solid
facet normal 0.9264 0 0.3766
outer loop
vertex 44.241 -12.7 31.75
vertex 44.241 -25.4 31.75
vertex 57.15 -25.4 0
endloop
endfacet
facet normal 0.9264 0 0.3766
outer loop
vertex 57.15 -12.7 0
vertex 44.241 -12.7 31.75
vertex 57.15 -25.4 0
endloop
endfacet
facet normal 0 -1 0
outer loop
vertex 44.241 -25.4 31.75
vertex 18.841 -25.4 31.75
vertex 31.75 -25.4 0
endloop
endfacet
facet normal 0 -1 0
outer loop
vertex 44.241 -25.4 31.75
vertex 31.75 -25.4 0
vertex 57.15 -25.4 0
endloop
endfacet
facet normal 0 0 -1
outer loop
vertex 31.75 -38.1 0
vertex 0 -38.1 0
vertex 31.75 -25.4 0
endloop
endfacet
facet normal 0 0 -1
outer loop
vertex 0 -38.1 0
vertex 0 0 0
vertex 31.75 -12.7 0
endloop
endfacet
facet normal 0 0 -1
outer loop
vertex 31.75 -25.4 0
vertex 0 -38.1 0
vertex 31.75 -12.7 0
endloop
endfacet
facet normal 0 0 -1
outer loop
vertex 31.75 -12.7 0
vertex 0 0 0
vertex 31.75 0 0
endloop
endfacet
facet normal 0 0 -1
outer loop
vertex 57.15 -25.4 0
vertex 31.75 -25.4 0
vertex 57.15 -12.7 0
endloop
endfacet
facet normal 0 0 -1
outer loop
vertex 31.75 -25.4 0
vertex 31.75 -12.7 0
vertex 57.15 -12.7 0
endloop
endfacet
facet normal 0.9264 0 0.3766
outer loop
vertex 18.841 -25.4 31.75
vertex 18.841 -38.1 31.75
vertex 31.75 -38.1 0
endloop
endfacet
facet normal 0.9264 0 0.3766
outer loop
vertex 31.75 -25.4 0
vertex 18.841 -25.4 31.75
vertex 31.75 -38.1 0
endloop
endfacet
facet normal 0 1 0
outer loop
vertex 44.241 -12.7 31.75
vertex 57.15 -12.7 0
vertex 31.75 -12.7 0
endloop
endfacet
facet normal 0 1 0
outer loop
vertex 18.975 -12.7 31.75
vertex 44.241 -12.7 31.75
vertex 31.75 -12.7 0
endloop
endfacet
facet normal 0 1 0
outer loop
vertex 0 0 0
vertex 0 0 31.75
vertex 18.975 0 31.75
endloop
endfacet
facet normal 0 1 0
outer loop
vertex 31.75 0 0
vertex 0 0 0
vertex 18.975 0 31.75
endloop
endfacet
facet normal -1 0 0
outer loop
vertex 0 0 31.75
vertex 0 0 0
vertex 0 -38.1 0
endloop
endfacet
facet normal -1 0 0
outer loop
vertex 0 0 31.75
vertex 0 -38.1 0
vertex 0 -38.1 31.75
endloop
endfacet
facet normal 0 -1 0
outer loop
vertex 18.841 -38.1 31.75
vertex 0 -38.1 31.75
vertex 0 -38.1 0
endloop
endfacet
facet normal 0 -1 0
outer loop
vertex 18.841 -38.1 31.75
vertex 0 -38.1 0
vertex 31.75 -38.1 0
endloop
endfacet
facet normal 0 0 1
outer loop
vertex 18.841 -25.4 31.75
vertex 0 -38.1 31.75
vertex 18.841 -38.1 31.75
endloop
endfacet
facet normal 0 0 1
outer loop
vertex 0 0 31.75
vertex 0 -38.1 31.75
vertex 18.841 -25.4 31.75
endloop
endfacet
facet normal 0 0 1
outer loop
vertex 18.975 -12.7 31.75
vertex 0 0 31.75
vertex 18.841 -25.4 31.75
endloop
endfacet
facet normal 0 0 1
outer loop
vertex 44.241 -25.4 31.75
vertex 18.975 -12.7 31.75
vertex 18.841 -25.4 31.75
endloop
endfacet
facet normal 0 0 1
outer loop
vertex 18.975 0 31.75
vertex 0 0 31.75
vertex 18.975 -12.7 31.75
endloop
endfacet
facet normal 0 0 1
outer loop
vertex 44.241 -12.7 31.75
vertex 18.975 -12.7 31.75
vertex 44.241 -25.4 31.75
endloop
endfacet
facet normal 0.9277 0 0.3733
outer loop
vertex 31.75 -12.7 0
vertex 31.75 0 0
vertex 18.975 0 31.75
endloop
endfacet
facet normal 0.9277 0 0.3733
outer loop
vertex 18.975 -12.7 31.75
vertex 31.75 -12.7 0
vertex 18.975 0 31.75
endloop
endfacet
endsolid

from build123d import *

# Parameters (mm, degrees)
F0_W     = 57.15
F0_H     = 31.75
F1_DEPTH = 38.1
F2_W     = 25.4
F2_H     = 31.75
F3_DEPTH = 12.7
F4_DEPTH = 12.7
F6_DEPTH = 12.7
F8_DEPTH = 12.7


with BuildPart() as f1:
    # F0 (on Front) → F1 (new body)
    with BuildSketch(Plane.XZ):
        with Locations((28.575, 15.875)):
            Rectangle(F0_W, F0_H)
    extrude(amount=F1_DEPTH)

    # F2 (on face) → F3 (cut)
    with BuildSketch(Plane.XZ.offset(38.1)):
        with Locations((44.45, 15.875)):
            Rectangle(F2_W, F2_H)
    extrude(amount=-F3_DEPTH, mode=Mode.SUBTRACT)

    # F2 (on face) → F4 (cut)
    with BuildSketch(Plane.XZ.offset(38.1)):
        Polygon((18.840961, 31.75), (31.75, 0), (31.75, 31.75), align=None)
    extrude(amount=-F4_DEPTH, mode=Mode.SUBTRACT)

    # F5 (on face) → F6 (cut)
    with BuildSketch(Plane.XZ.offset(25.4)):
        Polygon((44.240961, 31.75), (57.15, 0), (57.15, 31.75), align=None)
    extrude(amount=-F6_DEPTH, mode=Mode.SUBTRACT)

    # F7 (on face) → F8 (cut)
    with BuildSketch(Plane(origin=(0, 0, 0), x_dir=(-1, 0, 0), z_dir=(0, 1, 0))):
        Polygon((-57.15, 0), (-31.75, 0), (-18.975182, 31.75), (-57.15, 31.75), align=None)
    extrude(amount=-F8_DEPTH, mode=Mode.SUBTRACT)


solid = f1.part
